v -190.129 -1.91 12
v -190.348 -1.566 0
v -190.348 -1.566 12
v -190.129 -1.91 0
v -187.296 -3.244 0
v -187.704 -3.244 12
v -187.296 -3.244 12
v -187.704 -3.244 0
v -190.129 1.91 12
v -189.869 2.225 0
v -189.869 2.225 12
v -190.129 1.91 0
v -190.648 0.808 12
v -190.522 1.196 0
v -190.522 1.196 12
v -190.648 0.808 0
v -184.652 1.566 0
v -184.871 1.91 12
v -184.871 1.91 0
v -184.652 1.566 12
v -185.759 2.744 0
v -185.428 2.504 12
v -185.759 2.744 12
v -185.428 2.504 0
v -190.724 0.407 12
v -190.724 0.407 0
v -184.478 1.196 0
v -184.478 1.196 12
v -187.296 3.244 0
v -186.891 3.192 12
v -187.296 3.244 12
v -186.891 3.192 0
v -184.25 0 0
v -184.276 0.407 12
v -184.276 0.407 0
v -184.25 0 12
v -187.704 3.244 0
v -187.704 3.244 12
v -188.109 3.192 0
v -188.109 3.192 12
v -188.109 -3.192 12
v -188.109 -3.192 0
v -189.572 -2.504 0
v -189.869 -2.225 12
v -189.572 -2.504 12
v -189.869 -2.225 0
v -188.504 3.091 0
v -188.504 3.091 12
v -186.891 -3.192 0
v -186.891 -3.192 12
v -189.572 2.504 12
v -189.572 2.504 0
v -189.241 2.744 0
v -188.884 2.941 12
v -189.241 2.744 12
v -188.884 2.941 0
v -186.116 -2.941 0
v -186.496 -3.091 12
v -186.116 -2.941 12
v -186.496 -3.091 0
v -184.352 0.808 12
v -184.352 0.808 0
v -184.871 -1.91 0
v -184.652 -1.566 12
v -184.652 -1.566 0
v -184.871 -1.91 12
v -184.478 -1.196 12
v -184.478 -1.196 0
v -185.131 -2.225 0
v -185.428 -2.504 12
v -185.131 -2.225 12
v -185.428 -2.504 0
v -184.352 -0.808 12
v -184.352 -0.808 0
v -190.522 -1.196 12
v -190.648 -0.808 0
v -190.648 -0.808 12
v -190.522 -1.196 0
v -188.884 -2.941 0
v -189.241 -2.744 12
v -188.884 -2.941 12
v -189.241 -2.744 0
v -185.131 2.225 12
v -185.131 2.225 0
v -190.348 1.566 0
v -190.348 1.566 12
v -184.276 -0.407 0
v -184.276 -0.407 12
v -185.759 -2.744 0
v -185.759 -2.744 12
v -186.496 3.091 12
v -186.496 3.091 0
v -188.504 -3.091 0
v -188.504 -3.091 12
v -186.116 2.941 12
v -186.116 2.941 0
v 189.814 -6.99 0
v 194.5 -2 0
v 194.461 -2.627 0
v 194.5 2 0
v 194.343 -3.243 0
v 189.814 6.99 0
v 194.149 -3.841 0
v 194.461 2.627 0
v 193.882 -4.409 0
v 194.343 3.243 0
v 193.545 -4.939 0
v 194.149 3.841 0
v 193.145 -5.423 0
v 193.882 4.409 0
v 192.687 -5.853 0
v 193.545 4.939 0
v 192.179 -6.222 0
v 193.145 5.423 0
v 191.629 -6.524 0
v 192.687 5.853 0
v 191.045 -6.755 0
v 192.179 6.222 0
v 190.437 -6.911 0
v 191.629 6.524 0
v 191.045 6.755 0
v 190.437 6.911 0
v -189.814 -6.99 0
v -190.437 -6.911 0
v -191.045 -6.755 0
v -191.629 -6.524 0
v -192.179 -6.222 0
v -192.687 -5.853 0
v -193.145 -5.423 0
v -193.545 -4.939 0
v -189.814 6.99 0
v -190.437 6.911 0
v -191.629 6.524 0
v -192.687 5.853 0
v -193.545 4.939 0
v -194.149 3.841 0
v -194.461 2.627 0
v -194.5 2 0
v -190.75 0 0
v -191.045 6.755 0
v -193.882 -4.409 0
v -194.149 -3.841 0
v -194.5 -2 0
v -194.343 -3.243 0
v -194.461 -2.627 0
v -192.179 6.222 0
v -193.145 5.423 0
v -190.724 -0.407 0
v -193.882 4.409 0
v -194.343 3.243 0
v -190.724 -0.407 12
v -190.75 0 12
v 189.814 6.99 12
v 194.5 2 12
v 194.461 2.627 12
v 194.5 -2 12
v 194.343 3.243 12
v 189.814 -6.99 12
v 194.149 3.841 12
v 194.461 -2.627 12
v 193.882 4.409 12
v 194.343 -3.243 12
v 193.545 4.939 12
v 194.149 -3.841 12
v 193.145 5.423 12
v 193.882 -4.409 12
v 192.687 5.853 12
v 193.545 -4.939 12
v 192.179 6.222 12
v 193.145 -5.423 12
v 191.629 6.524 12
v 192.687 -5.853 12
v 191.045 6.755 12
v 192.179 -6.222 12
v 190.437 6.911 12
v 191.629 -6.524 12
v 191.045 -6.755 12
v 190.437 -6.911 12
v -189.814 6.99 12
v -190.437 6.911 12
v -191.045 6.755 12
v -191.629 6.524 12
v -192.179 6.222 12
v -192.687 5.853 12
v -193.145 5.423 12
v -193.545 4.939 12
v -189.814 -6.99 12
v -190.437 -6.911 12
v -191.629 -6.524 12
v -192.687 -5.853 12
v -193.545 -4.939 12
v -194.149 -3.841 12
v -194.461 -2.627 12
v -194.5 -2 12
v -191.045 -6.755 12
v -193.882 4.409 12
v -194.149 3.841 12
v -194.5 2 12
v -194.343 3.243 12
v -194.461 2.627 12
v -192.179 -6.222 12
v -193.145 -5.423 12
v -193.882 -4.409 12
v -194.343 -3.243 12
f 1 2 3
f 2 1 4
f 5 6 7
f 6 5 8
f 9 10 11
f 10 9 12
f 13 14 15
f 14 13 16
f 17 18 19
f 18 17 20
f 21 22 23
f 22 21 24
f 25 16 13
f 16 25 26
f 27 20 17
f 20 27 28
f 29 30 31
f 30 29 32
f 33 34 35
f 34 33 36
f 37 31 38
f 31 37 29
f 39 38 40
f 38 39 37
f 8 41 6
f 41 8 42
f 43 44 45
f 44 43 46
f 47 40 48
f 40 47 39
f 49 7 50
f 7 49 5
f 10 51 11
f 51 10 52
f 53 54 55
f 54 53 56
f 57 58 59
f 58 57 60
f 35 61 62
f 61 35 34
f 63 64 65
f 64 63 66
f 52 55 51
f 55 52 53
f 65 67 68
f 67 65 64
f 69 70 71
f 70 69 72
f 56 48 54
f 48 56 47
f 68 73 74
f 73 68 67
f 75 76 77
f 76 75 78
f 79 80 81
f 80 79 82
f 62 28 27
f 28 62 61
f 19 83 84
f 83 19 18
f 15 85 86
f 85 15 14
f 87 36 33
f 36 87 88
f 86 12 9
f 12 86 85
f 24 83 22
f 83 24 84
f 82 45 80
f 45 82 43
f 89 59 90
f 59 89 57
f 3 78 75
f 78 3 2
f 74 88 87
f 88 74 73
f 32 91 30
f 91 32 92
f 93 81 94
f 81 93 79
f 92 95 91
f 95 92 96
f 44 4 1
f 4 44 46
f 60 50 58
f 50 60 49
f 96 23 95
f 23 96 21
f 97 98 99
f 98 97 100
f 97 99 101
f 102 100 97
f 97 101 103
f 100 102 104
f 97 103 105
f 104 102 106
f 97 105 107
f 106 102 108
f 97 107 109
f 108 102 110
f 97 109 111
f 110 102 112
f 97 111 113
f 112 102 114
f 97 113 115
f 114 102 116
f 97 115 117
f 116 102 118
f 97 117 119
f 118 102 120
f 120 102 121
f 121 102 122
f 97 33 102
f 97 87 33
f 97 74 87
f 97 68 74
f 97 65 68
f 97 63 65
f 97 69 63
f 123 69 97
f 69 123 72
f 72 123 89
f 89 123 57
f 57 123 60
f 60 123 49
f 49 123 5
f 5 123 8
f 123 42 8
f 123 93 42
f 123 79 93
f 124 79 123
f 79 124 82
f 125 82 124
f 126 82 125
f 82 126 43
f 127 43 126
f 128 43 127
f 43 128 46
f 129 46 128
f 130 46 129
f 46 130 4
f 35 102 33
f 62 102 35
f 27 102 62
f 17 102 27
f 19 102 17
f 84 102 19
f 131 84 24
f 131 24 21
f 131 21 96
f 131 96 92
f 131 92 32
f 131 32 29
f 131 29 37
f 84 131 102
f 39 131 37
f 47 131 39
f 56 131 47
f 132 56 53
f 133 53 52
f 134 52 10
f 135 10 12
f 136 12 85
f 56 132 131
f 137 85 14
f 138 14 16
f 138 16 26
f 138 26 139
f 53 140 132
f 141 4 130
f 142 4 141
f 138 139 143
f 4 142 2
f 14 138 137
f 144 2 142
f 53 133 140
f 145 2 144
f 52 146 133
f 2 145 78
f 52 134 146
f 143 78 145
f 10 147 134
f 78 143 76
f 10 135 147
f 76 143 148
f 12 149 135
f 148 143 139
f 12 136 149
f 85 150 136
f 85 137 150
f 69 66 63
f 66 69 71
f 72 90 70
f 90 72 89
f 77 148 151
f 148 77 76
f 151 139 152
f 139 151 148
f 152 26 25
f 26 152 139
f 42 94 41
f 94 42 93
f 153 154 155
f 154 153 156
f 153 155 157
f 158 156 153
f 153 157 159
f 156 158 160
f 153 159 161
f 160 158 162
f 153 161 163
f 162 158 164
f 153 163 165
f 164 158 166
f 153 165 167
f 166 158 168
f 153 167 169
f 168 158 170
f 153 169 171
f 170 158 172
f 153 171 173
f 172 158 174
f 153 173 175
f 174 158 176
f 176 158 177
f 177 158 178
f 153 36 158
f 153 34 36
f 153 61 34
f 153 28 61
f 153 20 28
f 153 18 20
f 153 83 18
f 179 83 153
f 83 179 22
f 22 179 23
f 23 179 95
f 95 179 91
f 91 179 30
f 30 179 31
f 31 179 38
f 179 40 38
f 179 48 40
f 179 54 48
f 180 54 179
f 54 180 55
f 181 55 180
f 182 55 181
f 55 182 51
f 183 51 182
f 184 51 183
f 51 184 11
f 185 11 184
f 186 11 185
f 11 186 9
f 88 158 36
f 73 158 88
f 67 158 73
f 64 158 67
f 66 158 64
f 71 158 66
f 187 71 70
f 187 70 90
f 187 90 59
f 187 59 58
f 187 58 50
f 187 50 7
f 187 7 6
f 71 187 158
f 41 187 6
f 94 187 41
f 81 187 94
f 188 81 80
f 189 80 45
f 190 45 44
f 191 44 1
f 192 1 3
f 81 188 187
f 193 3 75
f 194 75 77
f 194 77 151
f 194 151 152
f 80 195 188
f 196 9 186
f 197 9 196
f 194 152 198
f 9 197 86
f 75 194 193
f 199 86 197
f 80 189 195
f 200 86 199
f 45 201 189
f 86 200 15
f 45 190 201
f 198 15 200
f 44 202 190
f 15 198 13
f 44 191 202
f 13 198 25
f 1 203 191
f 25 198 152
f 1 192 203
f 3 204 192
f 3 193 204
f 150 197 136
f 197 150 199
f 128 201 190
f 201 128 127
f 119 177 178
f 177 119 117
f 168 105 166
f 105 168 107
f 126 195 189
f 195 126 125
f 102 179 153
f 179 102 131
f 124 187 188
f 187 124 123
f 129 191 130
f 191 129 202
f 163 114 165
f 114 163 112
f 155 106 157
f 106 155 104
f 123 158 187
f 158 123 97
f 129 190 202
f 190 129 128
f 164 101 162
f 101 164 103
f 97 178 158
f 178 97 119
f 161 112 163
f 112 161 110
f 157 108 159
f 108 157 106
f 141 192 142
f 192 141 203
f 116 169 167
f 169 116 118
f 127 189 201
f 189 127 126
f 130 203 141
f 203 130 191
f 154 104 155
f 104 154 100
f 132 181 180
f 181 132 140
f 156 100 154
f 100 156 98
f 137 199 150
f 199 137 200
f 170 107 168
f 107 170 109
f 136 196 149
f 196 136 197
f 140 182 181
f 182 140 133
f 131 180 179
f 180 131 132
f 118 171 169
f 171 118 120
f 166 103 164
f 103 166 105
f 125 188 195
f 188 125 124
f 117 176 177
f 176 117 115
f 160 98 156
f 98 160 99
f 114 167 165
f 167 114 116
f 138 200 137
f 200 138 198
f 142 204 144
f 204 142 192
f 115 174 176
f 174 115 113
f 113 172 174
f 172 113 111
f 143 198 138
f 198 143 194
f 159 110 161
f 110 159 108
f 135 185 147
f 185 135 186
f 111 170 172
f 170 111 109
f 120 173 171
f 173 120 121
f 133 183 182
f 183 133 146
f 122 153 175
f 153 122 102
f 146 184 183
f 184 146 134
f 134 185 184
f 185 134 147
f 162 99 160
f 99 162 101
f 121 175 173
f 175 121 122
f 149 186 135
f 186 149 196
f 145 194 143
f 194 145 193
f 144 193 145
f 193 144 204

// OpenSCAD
$fn = 50;


difference() {
	union() {
		hull() {
			translate(v = [-189.5000000000, 2.0000000000, 0]) {
				cylinder(h = 12, r = 5);
			}
			translate(v = [189.5000000000, 2.0000000000, 0]) {
				cylinder(h = 12, r = 5);
			}
			translate(v = [-189.5000000000, -2.0000000000, 0]) {
				cylinder(h = 12, r = 5);
			}
			translate(v = [189.5000000000, -2.0000000000, 0]) {
				cylinder(h = 12, r = 5);
			}
		}
	}
	union() {
		translate(v = [-187.5000000000, 0.0000000000, 0]) {
			cylinder(h = 12, r = 3.2500000000);
		}
		translate(v = [-187.5000000000, 0.0000000000, 0]) {
			cylinder(h = 12, r = 1.8000000000);
		}
		translate(v = [-187.5000000000, 0.0000000000, 0]) {
			cylinder(h = 12, r = 1.8000000000);
		}
		translate(v = [-187.5000000000, 0.0000000000, 0]) {
			cylinder(h = 12, r = 1.8000000000);
		}
	}
}
